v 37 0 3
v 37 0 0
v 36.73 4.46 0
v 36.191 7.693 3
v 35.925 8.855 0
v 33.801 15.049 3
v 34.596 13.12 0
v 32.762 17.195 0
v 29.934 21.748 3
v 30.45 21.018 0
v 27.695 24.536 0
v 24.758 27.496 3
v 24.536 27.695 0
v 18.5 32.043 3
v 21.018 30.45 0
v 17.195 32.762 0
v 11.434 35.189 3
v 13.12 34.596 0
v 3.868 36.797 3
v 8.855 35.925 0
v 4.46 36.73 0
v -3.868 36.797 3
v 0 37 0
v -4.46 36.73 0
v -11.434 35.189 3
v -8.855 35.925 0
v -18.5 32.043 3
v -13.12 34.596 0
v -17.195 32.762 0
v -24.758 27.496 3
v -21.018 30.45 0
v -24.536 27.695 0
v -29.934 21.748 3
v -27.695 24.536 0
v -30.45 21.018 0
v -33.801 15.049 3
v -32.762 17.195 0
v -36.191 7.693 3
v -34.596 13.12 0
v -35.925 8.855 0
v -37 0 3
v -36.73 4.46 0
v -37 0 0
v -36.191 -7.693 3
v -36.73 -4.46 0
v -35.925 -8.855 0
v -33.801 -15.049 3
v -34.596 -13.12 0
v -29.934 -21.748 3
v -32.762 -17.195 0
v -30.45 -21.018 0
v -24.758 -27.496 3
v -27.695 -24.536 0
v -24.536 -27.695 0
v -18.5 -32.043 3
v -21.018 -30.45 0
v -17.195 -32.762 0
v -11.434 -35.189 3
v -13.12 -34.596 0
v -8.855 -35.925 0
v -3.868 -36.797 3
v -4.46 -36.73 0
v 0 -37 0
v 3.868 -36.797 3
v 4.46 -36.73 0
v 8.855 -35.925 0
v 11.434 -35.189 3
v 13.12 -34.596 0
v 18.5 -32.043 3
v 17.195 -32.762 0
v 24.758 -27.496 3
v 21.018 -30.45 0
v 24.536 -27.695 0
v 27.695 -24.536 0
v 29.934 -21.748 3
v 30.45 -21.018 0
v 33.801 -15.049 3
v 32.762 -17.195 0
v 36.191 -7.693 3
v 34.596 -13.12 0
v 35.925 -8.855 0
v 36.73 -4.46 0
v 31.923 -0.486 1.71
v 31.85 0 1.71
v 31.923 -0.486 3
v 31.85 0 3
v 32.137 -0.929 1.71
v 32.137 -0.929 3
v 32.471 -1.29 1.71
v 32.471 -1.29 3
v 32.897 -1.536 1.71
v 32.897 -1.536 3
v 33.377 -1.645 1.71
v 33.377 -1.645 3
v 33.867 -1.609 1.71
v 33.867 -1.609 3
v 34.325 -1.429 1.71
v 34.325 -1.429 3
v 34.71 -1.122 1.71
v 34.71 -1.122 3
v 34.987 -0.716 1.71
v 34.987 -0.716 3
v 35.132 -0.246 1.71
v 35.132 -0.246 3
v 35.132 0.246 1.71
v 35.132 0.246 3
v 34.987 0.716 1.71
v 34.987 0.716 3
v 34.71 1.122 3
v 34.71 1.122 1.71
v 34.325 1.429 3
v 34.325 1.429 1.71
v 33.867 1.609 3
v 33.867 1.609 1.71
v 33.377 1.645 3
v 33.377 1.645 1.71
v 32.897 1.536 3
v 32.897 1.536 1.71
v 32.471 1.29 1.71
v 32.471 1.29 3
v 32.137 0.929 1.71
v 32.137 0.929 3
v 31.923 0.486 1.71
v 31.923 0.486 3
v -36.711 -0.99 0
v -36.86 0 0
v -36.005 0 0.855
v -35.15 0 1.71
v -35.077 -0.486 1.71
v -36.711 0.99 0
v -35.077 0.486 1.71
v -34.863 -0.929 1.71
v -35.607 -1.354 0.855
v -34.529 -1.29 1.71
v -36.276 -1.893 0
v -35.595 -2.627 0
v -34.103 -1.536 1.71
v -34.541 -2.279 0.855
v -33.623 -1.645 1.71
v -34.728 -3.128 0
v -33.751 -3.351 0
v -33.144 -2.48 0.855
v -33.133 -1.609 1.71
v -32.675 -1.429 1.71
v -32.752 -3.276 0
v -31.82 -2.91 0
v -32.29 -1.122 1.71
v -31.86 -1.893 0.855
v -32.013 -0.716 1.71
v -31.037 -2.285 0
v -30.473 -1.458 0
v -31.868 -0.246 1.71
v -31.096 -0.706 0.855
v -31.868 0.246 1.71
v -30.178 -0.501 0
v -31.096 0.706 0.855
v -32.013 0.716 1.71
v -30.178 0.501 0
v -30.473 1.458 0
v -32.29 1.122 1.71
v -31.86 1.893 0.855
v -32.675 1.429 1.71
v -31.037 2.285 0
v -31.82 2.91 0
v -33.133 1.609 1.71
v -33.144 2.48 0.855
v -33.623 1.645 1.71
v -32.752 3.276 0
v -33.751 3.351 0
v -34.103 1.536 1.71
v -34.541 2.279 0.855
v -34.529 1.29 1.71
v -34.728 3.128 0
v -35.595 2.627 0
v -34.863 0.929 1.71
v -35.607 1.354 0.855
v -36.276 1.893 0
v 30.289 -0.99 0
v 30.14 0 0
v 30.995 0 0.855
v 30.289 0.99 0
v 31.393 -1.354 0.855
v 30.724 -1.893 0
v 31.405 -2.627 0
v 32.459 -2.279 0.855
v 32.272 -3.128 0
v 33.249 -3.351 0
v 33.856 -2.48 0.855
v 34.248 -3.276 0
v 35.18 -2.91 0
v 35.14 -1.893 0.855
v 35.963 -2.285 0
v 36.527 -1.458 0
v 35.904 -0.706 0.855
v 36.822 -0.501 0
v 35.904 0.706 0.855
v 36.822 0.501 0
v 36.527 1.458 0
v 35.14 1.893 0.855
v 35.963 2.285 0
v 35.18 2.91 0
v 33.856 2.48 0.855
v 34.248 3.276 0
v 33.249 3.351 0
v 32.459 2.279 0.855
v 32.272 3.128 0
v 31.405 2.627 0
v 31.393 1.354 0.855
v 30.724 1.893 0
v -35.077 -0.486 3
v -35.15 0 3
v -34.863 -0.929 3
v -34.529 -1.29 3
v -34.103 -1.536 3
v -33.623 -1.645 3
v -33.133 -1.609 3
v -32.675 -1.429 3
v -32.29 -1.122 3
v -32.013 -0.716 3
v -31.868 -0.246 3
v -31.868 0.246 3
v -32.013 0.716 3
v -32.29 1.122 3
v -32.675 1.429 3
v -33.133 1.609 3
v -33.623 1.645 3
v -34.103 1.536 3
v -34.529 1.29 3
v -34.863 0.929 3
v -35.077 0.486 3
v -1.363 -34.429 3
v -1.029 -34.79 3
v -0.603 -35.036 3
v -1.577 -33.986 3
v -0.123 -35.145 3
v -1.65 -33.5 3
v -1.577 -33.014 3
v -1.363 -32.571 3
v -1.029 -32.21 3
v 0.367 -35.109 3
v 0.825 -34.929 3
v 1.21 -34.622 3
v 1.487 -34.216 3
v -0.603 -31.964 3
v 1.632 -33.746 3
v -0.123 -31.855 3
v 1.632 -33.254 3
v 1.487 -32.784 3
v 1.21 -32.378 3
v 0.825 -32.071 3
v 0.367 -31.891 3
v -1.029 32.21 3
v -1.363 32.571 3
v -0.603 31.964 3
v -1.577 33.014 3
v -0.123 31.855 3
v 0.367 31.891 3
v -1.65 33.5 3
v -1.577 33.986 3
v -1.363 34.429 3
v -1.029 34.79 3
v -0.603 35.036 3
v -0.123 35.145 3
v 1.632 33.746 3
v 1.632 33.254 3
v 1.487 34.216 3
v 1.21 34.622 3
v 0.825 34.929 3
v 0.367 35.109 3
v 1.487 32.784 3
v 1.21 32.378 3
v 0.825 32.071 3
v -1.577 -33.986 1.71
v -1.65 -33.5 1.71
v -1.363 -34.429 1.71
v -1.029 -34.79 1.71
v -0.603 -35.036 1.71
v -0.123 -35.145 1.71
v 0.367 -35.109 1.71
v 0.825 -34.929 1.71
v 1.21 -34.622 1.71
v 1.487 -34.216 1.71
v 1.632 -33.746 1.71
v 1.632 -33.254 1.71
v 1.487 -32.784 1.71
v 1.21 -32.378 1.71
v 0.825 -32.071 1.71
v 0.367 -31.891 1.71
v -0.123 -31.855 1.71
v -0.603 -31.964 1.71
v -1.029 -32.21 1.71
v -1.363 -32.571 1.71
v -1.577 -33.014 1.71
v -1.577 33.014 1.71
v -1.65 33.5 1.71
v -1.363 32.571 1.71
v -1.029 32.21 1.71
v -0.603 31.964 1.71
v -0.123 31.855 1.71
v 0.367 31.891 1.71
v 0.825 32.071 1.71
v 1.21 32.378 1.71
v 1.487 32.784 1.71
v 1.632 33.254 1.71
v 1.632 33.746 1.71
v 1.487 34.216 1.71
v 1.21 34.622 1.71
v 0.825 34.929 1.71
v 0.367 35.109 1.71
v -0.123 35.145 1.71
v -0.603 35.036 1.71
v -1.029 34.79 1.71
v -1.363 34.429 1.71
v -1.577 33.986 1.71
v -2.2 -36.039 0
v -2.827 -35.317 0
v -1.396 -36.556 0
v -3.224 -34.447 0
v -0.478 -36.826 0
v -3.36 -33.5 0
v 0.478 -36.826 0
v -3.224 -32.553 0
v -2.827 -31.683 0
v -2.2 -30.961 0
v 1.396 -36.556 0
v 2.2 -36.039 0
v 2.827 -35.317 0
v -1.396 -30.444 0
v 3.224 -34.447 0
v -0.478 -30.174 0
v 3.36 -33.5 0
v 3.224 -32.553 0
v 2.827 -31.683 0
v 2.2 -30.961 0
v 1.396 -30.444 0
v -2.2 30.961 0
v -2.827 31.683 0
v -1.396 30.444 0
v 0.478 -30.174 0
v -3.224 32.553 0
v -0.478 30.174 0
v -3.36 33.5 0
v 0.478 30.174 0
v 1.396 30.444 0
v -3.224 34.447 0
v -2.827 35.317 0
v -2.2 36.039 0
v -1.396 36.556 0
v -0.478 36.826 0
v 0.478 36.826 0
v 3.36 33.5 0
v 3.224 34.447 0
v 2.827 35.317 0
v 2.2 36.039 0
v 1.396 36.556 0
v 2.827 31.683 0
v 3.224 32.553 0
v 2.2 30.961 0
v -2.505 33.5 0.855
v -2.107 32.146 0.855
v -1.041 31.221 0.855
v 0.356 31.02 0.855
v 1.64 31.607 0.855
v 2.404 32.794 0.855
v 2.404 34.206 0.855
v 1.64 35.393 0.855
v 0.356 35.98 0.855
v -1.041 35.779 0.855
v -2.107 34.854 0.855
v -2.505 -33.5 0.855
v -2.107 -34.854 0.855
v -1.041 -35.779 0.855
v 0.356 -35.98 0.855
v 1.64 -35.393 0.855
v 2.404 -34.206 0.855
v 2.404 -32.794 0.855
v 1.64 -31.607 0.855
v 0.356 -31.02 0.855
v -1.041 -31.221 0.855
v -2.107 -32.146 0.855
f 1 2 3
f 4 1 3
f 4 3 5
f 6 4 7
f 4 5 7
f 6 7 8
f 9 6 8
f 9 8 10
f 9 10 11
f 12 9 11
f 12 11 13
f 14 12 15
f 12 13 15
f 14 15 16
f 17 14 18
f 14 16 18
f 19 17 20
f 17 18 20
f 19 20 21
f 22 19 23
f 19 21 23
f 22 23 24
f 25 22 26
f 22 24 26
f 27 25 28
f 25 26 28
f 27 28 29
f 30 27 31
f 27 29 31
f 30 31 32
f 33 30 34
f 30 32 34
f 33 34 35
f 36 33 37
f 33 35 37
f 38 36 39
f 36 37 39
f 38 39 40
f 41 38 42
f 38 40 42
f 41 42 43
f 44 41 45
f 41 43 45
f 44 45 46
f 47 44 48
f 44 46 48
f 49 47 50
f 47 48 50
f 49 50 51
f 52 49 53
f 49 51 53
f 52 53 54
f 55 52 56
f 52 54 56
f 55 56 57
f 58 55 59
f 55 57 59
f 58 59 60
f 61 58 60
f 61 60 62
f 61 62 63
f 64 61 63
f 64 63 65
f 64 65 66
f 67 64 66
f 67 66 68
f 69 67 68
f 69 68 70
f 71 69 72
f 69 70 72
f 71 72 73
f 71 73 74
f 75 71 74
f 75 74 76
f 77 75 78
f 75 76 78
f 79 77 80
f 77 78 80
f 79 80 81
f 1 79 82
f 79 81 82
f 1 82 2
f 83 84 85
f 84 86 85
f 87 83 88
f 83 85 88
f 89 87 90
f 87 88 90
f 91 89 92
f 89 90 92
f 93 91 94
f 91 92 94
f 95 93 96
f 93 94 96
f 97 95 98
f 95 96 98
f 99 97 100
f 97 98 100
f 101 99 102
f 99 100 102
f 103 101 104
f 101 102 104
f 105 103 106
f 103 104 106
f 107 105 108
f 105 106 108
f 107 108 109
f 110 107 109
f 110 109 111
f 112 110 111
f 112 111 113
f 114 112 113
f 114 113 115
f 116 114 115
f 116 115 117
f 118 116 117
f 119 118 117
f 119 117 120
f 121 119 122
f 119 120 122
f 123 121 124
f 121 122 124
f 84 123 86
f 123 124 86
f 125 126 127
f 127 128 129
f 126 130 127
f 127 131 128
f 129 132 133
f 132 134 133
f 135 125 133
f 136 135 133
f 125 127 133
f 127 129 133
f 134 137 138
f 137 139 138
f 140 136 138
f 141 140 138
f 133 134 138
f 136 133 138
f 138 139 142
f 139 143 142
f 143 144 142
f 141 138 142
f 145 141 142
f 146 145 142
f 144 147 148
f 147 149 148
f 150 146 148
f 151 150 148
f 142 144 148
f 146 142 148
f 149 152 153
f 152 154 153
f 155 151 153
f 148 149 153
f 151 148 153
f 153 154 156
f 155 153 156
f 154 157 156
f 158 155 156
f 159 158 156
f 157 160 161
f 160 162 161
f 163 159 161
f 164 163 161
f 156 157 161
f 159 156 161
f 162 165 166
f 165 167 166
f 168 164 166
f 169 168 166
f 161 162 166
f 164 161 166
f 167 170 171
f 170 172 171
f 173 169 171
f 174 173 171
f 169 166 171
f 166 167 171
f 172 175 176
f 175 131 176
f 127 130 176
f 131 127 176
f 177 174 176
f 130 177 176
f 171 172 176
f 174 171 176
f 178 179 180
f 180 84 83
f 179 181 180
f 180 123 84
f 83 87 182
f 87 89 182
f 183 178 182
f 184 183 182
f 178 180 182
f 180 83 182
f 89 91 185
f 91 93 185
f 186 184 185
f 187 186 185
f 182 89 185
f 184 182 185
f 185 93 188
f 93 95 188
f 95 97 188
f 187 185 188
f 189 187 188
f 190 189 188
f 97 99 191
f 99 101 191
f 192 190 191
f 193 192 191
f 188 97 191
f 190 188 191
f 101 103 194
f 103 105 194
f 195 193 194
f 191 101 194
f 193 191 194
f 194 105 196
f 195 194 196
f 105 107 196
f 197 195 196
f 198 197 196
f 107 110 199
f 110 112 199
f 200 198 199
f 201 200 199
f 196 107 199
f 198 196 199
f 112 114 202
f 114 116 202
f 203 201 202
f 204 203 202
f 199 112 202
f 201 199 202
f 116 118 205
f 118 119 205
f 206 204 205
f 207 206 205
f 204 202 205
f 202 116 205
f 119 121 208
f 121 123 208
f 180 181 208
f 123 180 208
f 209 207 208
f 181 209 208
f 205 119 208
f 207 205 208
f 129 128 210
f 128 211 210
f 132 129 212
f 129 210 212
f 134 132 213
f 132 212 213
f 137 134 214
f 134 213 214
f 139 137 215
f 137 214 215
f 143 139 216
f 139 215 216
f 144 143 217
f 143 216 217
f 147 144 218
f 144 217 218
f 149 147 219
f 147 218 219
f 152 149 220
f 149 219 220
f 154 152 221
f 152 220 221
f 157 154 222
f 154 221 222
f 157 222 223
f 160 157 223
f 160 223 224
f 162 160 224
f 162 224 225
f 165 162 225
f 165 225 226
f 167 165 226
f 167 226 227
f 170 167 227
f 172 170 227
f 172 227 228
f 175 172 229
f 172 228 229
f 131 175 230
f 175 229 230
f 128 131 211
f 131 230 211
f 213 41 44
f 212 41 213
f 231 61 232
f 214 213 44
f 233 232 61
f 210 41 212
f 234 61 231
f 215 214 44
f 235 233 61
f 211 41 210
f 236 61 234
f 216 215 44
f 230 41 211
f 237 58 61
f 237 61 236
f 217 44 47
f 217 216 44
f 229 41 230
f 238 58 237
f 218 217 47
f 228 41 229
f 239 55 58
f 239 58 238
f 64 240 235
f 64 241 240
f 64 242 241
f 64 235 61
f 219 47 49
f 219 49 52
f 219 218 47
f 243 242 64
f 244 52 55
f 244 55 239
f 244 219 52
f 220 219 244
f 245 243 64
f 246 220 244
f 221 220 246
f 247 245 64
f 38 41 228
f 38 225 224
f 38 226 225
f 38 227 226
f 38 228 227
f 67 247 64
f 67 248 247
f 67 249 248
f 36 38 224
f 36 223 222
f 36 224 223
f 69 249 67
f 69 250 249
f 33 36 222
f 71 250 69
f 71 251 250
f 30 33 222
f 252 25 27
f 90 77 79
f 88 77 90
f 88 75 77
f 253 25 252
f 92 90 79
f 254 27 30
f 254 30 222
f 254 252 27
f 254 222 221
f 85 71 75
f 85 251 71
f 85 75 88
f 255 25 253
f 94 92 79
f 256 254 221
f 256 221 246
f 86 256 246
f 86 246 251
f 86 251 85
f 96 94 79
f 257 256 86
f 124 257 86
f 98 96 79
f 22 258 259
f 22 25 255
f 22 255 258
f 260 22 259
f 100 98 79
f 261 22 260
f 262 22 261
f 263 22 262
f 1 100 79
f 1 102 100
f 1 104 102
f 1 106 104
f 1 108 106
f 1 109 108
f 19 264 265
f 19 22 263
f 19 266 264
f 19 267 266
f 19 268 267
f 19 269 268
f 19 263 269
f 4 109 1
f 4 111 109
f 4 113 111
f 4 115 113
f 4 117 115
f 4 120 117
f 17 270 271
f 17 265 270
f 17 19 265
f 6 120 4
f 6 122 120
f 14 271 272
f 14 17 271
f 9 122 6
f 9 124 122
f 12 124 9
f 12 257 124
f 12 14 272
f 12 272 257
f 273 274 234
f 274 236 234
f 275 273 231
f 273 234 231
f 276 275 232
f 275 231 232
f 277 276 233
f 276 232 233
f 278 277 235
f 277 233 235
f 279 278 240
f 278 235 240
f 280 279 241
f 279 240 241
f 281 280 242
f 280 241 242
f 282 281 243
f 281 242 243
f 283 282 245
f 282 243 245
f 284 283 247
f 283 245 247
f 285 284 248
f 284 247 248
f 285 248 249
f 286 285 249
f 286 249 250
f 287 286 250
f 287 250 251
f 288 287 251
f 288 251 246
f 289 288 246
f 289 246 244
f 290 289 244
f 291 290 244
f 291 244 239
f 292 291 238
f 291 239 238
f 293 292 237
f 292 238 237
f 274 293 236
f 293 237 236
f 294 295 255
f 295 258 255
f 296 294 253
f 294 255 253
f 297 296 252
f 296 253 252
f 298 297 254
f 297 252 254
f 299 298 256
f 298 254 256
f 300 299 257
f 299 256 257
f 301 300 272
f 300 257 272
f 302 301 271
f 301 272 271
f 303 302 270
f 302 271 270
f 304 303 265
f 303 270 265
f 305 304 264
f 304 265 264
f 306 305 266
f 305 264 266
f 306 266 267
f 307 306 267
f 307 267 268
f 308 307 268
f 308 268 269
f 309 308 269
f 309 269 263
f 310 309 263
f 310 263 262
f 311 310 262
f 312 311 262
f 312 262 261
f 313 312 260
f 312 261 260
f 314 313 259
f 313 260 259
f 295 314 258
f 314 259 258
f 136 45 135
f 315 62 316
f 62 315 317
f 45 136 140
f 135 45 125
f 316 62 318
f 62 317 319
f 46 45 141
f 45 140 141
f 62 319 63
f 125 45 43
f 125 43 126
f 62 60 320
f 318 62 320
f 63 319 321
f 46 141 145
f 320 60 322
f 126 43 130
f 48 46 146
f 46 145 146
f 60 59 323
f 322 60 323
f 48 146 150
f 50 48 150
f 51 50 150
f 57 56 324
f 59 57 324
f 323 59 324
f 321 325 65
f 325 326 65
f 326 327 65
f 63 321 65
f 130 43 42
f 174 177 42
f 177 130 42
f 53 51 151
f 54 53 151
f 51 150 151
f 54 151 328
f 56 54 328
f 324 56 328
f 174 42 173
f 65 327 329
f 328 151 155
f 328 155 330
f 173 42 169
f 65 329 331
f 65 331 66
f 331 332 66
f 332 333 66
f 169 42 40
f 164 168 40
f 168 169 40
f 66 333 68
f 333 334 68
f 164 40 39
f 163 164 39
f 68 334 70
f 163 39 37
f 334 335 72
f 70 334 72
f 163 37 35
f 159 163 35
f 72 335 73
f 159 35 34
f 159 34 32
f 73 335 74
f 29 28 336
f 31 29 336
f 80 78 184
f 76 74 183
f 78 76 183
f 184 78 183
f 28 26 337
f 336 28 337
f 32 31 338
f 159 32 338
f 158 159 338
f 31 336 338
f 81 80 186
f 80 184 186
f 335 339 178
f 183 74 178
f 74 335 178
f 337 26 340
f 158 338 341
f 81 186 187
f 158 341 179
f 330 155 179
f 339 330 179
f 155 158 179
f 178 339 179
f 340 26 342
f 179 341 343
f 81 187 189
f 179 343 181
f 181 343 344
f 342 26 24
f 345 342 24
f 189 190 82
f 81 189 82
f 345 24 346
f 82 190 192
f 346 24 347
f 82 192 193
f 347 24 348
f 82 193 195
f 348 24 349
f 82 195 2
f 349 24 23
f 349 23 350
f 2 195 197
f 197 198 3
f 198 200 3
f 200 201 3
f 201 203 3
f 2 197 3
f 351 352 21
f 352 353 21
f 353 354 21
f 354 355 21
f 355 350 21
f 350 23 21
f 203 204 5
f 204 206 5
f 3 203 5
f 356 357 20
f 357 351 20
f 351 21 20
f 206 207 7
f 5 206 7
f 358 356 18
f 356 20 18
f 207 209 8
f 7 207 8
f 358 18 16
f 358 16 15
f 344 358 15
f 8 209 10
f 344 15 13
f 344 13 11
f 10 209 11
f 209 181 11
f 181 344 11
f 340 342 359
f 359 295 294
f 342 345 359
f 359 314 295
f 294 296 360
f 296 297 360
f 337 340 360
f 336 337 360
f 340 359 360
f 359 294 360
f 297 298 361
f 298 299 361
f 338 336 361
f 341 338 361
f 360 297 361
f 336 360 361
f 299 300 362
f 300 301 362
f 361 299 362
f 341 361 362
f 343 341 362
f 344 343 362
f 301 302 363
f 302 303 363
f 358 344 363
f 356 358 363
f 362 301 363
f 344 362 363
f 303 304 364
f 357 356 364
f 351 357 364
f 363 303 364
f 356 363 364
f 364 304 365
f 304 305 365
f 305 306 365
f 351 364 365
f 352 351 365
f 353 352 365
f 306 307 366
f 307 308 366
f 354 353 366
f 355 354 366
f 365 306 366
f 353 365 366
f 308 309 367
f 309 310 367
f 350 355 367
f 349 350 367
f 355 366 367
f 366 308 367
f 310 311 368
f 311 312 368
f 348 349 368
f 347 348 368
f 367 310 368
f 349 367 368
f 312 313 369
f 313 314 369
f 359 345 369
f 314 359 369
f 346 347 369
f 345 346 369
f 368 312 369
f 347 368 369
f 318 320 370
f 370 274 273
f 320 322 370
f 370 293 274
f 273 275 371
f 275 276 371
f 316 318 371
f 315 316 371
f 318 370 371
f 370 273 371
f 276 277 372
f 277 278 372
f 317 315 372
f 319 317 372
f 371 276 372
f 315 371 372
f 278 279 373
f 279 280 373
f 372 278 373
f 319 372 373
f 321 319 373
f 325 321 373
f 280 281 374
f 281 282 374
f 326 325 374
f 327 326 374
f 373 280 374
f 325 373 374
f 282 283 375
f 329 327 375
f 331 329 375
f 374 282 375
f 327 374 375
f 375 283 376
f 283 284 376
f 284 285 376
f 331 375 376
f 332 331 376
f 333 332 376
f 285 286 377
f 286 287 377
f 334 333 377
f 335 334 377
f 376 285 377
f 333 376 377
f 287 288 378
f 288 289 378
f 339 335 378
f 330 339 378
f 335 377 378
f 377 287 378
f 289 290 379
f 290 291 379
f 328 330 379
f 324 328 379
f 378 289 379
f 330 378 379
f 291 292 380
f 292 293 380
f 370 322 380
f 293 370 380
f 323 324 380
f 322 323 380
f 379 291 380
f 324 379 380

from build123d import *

# Parameters (mm, degrees)
F0_R           = 37
F1_DEPTH       = 3
F3_D           = 3.3
F3_CSINK_D     = 6.72
F3_CSINK_ANGLE = 90


with BuildPart() as f1:
    # F0 (on Top) → F1 (new body)
    with BuildSketch(Plane.XY):
        Circle(F0_R)
    extrude(amount=F1_DEPTH)

    # F3 (through all)
    with Locations(Plane(origin=(0, 0, 0), x_dir=(1, 0, 0), z_dir=(0, 0, -1))):
        with Locations((-33.5, 0), (0, 33.5), (33.5, 0), (0, -33.5)):
            CounterSinkHole(F3_D / 2, F3_CSINK_D / 2, counter_sink_angle=F3_CSINK_ANGLE)


solid = f1.part
